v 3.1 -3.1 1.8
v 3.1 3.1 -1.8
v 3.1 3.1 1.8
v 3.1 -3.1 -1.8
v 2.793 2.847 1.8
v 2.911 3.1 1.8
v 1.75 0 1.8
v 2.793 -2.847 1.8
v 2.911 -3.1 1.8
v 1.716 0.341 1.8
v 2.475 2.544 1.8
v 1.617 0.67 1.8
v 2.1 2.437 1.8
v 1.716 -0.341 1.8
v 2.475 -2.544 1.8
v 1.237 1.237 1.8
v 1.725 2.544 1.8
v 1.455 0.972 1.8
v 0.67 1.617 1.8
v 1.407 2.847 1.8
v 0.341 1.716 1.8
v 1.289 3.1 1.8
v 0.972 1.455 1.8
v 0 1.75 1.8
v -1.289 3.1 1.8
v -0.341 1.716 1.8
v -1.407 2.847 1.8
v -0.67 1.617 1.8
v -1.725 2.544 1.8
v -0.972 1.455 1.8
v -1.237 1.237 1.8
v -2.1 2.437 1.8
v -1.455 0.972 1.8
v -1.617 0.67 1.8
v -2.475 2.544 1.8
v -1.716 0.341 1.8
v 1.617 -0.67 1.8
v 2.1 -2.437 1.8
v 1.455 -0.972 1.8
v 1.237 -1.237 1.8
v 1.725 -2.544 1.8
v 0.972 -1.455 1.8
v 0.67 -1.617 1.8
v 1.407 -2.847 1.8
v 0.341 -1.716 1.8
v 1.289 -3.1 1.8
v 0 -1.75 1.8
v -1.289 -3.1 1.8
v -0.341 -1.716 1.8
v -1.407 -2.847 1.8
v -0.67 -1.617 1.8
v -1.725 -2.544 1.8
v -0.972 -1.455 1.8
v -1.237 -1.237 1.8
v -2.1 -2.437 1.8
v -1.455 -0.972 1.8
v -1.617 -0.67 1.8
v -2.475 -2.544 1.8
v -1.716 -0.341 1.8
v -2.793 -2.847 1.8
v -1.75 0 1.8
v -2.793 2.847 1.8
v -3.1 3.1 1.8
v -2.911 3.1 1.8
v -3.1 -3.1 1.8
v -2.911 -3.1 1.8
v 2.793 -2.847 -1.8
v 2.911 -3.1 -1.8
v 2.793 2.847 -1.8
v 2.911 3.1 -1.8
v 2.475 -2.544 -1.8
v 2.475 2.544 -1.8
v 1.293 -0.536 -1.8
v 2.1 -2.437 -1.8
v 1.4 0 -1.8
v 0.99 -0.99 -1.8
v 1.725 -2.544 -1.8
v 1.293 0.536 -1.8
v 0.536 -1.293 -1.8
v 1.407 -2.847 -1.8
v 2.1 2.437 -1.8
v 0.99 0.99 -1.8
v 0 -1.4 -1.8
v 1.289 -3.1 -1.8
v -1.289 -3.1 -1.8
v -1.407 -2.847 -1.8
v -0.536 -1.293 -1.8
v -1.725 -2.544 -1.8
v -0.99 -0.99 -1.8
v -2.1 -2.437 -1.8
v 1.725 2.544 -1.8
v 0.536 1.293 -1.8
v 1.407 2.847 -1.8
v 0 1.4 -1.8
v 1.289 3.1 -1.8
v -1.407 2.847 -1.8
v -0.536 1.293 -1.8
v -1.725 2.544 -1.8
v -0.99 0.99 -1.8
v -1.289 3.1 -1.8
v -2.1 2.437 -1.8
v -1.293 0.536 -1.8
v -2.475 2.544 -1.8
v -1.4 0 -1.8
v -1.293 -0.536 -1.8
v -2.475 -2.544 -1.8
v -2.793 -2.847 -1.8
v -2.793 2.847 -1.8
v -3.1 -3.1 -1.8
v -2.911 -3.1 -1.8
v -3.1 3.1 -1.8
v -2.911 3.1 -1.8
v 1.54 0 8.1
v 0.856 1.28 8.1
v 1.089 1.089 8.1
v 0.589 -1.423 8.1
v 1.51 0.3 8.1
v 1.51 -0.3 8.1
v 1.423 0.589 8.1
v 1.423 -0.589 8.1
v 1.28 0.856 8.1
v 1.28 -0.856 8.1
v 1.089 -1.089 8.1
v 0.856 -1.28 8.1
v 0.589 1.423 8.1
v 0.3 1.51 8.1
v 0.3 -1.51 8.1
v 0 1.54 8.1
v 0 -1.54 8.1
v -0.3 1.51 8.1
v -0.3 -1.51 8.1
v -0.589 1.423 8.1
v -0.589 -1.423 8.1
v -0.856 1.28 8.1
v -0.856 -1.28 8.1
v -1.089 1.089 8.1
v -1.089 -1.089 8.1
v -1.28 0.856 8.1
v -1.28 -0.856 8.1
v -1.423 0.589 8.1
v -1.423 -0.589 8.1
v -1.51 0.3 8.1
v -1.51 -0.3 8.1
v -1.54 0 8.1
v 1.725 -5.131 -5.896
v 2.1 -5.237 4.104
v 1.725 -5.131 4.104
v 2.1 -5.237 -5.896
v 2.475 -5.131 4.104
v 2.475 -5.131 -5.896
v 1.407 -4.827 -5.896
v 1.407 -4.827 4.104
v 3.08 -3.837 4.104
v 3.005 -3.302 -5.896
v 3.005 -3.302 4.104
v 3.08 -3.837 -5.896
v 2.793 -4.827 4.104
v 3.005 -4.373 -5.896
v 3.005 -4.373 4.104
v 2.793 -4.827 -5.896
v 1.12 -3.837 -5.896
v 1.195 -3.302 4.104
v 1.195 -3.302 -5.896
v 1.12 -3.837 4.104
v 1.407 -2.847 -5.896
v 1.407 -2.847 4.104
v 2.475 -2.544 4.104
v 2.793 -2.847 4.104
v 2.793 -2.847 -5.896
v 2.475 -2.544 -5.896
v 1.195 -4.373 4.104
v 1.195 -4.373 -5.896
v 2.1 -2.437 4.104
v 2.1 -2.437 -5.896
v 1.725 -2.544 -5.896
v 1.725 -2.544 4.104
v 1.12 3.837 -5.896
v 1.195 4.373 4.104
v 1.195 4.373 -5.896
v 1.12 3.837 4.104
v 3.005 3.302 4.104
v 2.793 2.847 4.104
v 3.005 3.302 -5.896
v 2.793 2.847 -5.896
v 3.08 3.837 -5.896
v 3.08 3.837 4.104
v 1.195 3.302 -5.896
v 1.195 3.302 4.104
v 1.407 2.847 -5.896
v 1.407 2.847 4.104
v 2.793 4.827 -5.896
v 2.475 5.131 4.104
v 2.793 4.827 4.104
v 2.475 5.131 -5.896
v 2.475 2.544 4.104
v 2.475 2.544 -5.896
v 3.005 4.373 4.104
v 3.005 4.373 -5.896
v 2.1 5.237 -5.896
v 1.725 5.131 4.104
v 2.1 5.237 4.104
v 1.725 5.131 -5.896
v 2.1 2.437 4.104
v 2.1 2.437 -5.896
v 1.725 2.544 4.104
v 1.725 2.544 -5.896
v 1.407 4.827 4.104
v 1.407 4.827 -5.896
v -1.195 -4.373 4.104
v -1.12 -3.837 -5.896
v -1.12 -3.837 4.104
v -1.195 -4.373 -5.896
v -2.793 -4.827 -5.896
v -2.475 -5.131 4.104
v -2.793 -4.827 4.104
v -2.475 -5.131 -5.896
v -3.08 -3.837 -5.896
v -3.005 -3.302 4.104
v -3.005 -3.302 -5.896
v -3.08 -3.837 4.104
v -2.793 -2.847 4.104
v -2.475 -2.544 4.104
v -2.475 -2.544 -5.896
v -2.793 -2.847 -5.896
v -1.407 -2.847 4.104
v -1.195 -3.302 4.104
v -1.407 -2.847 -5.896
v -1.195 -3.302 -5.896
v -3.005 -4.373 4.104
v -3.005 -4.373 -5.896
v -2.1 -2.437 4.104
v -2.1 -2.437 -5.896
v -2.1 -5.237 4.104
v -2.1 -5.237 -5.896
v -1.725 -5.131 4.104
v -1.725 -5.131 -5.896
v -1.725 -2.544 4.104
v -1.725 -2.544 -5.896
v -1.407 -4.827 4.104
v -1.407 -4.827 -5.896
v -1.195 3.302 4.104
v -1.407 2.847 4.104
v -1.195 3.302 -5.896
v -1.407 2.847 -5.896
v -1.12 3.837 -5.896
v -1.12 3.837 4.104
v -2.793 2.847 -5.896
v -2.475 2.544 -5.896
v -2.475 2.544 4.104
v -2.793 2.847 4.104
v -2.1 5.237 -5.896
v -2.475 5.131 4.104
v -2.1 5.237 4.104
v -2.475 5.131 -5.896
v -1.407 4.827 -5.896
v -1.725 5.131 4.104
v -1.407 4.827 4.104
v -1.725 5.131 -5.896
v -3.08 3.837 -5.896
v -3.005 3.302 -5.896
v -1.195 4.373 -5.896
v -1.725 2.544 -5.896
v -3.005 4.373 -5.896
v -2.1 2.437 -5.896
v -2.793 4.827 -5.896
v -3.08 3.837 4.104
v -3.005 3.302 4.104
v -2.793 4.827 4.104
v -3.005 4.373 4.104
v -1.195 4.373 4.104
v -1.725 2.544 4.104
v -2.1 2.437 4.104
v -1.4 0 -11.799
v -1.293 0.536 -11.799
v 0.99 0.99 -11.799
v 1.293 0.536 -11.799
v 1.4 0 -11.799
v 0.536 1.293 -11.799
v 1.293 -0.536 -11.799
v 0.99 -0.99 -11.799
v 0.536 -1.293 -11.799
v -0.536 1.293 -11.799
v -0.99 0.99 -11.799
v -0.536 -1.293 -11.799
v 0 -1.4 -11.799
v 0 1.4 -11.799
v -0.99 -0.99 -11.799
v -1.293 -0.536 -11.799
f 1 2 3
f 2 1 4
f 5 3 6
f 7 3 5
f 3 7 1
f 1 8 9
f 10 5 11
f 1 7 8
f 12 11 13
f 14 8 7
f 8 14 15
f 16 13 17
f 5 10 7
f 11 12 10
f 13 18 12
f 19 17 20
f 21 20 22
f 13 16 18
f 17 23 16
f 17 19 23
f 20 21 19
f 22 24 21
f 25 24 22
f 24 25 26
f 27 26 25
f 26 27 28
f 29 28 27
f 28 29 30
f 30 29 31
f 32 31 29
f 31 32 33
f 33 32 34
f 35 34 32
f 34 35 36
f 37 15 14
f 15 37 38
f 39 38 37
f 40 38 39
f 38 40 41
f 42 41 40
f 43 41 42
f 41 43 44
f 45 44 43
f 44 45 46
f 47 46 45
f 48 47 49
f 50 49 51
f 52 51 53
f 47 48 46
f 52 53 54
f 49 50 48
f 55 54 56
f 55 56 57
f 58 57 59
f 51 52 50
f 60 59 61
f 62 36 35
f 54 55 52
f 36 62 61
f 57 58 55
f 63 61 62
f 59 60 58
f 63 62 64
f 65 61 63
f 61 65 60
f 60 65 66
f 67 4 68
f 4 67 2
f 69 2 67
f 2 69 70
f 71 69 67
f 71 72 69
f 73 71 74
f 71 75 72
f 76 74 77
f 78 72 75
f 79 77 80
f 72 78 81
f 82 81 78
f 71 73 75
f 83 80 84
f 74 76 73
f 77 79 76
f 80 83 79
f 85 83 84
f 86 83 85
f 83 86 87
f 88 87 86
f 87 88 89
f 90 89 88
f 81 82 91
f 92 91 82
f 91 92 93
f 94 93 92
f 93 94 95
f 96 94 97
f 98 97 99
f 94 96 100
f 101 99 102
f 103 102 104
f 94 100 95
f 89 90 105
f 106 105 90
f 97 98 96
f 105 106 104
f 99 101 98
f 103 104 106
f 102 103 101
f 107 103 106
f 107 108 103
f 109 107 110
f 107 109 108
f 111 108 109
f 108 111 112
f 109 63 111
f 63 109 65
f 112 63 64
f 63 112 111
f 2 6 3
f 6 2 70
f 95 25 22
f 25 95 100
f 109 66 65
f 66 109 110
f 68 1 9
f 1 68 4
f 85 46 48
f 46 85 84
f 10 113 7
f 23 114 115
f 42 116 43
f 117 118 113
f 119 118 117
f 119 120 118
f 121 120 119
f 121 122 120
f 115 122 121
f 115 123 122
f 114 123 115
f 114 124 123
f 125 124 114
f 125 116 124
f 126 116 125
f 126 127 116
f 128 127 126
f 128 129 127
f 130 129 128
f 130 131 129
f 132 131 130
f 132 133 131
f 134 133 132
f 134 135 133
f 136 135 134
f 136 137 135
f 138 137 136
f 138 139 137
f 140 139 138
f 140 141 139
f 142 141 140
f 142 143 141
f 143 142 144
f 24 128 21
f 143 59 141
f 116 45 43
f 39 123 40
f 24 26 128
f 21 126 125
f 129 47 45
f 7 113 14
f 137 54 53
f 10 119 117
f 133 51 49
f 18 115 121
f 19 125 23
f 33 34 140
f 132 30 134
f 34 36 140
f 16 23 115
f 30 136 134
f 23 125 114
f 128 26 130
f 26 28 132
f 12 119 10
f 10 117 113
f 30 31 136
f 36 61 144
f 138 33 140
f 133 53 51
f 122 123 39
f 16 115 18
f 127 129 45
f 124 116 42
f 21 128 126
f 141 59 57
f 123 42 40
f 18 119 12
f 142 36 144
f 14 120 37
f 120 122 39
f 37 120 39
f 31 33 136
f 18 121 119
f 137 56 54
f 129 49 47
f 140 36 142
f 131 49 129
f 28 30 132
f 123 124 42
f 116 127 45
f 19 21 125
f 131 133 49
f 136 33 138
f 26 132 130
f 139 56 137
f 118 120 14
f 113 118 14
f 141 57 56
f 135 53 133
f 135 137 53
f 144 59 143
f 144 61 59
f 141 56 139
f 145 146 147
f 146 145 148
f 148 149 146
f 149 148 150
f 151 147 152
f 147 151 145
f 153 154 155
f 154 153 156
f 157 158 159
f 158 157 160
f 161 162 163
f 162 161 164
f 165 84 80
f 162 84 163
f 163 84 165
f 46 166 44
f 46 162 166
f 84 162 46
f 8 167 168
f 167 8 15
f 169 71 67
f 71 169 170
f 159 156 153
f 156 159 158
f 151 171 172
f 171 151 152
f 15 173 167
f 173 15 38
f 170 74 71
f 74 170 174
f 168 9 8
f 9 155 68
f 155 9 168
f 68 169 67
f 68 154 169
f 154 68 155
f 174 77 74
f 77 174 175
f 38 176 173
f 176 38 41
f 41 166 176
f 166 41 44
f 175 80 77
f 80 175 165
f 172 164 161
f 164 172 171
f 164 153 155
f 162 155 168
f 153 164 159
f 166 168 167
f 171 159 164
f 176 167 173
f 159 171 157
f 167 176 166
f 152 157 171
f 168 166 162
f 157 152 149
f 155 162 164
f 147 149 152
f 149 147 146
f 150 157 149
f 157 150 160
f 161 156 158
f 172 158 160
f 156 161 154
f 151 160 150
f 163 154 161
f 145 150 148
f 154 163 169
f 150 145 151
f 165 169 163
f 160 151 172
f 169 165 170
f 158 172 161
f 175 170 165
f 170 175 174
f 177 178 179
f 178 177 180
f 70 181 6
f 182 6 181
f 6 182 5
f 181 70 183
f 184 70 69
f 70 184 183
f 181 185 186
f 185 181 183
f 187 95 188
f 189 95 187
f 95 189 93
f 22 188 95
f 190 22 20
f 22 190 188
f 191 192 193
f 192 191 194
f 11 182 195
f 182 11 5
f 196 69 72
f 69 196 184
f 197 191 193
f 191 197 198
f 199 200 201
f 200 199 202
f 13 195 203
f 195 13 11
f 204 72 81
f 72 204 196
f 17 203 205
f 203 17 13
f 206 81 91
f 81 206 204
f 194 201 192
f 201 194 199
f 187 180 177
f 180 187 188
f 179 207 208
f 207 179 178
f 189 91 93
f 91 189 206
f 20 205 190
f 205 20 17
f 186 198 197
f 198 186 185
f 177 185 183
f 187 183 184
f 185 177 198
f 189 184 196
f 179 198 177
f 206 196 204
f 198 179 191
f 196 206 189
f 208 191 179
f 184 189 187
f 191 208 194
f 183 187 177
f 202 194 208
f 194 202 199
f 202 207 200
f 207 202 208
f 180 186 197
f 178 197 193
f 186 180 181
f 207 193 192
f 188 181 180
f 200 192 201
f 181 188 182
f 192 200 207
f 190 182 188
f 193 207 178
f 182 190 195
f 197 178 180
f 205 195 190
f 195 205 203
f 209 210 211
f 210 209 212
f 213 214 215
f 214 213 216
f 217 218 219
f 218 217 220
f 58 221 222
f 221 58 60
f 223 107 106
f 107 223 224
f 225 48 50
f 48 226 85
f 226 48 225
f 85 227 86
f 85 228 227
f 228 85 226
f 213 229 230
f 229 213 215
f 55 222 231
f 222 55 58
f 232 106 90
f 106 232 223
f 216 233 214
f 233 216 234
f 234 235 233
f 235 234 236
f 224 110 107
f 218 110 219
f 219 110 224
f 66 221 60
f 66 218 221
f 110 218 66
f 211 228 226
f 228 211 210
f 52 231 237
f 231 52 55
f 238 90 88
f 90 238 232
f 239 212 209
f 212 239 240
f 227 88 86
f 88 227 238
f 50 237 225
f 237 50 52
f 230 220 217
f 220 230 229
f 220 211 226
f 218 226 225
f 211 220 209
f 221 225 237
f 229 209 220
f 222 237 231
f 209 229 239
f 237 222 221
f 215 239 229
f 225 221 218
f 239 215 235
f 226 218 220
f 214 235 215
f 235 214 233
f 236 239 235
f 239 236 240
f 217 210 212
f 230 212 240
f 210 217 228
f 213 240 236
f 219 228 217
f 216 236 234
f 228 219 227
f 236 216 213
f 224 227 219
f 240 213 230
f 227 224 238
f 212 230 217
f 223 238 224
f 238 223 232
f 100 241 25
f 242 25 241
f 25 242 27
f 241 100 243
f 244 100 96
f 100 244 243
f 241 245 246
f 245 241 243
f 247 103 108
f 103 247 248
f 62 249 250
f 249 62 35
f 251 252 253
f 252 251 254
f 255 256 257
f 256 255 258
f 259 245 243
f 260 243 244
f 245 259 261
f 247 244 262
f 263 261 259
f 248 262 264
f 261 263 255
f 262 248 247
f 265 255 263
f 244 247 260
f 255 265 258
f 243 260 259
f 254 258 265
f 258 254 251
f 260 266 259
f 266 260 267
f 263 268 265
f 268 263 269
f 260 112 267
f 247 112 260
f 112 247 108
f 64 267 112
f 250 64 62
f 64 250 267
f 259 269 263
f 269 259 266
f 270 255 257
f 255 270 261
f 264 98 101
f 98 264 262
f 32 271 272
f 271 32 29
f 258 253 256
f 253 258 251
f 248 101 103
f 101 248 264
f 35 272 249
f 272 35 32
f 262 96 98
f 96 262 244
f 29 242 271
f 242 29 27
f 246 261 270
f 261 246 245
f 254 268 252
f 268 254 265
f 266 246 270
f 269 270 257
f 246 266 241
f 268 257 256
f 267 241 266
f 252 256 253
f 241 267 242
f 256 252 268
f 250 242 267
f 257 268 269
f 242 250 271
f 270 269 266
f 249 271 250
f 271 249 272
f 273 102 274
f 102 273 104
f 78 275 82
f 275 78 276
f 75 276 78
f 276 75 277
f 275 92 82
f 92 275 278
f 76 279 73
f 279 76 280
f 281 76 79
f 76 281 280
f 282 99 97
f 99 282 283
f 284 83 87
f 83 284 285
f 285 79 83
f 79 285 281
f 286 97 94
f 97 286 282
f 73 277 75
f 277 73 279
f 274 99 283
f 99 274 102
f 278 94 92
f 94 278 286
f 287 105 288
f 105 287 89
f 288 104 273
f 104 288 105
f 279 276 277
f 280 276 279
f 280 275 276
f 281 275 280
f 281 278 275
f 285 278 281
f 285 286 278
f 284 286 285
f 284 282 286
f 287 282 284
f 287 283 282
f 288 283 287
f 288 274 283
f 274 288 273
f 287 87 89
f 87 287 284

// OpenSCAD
// Start: lazy_union
default_5_default_5();
// End: lazy_union

// Modules.

// 'PartMaterial undef-default - default 5.0'
module default_5_default_5() {
  // 'None : _combine_solids_and_holes'
  union() {
    // 'default : _combine_solids_and_holes'
    union() {
      // 'switch : _combine_solids_and_holes'
      union() {
        // 'body'
        multmatrix(m=[[1.0, 0.0, 0.0, -3.1], [0.0, 1.0, 0.0, -3.1], [0.0, 0.0, 1.0, -1.8], [0.0, 0.0, 0.0, 1.0]]) {
          // 'body : _combine_solids_and_holes'
          union() {
            // 'body'
            cube(size=[6.2, 6.2, 3.6]);
          }
        }
        // 'shaft'
        multmatrix(m=[[1.0, 0.0, 0.0, 0.0], [0.0, 1.0, 0.0, 0.0], [0.0, 0.0, 1.0, 1.8], [0.0, 0.0, 0.0, 1.0]]) {
          // 'shaft : _combine_solids_and_holes'
          union() {
            // 'shaft'
            cylinder(h=6.3, r1=1.75, r2=1.54, center=false, $fn=32);
          }
        }
        // ('lead', 3)
        multmatrix(m=[[0.0, 0.0, 1.0, -2.45], [0.0, -1.0, 0.0, -3.1], [1.0, 0.0, 0.0, -1.8], [0.0, 0.0, 0.0, 1.0]]) {
          // "('lead', 3) : _combine_solids_and_holes"
          union() {
            // 'terminal : _combine_solids_and_holes'
            union() {
              // 'terminal'
              linear_extrude(height=0.7, twist=0.0, slices=4, scale=[1.0, 1.0], $fn=32) {
                polygon(points=[[0.0, 0.0], [-0.7, 0.0], [-0.7359958083311317, 0.00216732586469226], [-0.7714715190194863, 0.008637988116077133], [-0.8059145492294425, 0.019318493196427367], [-0.8388272371594507, 0.03405452020635208], [-0.8697340326773294, 0.05263315066264182], [-0.8981883684676073, 0.07478594492317342], [-2.1481883684676077, 1.174785944923174], [-3.3981883684676086, 0.07478594492317447], [-3.426642704257887, 0.0526331506626429], [-3.457549499775765, 0.034054520206353245], [-3.4904621877057735, 0.019318493196428588], [-3.5249052179157294, 0.00863798811607841], [-3.560380928604084, 0.0021673258646935367], [-3.5963767369352158, 1.27675647831893e-15], [-4.096376736935216, 1.1906291571089884e-15], [-4.096376736935216, 0.30000000000000115], [-3.596376736935216, 0.3000000000000012], [-2.3463767369352158, 1.400000000000001], [-2.287015605627059, 1.4407314247168224], [-2.219659887487095, 1.466147956807097], [-2.1481883684676086, 1.4747859449231742], [-2.0767168494481223, 1.466147956807097], [-2.009361131308158, 1.4407314247168221], [-1.950000000000001, 1.4000000000000008], [-0.7000000000000015, 0.2999999999999998], [1.2999999999999983, 0.29999999999999827], [1.299999999999998, 0.0]]);
              }
            }
          }
        }
        // ('lead', 1)
        multmatrix(m=[[0.0, 0.0, 1.0, 1.75], [0.0, -1.0, 0.0, -3.1], [1.0, 0.0, 0.0, -1.8], [0.0, 0.0, 0.0, 1.0]]) {
          // "('lead', 1) : _combine_solids_and_holes"
          union() {
            // 'terminal : _combine_solids_and_holes'
            union() {
              // 'terminal'
              linear_extrude(height=0.7, twist=0.0, slices=4, scale=[1.0, 1.0], $fn=32) {
                polygon(points=[[0.0, 0.0], [-0.7, 0.0], [-0.7359958083311317, 0.00216732586469226], [-0.7714715190194863, 0.008637988116077133], [-0.8059145492294425, 0.019318493196427367], [-0.8388272371594507, 0.03405452020635208], [-0.8697340326773294, 0.05263315066264182], [-0.8981883684676073, 0.07478594492317342], [-2.1481883684676077, 1.174785944923174], [-3.3981883684676086, 0.07478594492317447], [-3.426642704257887, 0.0526331506626429], [-3.457549499775765, 0.034054520206353245], [-3.4904621877057735, 0.019318493196428588], [-3.5249052179157294, 0.00863798811607841], [-3.560380928604084, 0.0021673258646935367], [-3.5963767369352158, 1.27675647831893e-15], [-4.096376736935216, 1.1906291571089884e-15], [-4.096376736935216, 0.30000000000000115], [-3.596376736935216, 0.3000000000000012], [-2.3463767369352158, 1.400000000000001], [-2.287015605627059, 1.4407314247168224], [-2.219659887487095, 1.466147956807097], [-2.1481883684676086, 1.4747859449231742], [-2.0767168494481223, 1.466147956807097], [-2.009361131308158, 1.4407314247168221], [-1.950000000000001, 1.4000000000000008], [-0.7000000000000015, 0.2999999999999998], [1.2999999999999983, 0.29999999999999827], [1.299999999999998, 0.0]]);
              }
            }
          }
        }
        // ('lead', 2)
        multmatrix(m=[[0.0, 0.0, -1.0, 2.45], [0.0, 1.0, 0.0, 3.1], [1.0, 0.0, 0.0, -1.8], [0.0, 0.0, 0.0, 1.0]]) {
          // "('lead', 2) : _combine_solids_and_holes"
          union() {
            // 'terminal : _combine_solids_and_holes'
            union() {
              // 'terminal'
              linear_extrude(height=0.7, twist=0.0, slices=4, scale=[1.0, 1.0], $fn=32) {
                polygon(points=[[0.0, 0.0], [-0.7, 0.0], [-0.7359958083311317, 0.00216732586469226], [-0.7714715190194863, 0.008637988116077133], [-0.8059145492294425, 0.019318493196427367], [-0.8388272371594507, 0.03405452020635208], [-0.8697340326773294, 0.05263315066264182], [-0.8981883684676073, 0.07478594492317342], [-2.1481883684676077, 1.174785944923174], [-3.3981883684676086, 0.07478594492317447], [-3.426642704257887, 0.0526331506626429], [-3.457549499775765, 0.034054520206353245], [-3.4904621877057735, 0.019318493196428588], [-3.5249052179157294, 0.00863798811607841], [-3.560380928604084, 0.0021673258646935367], [-3.5963767369352158, 1.27675647831893e-15], [-4.096376736935216, 1.1906291571089884e-15], [-4.096376736935216, 0.30000000000000115], [-3.596376736935216, 0.3000000000000012], [-2.3463767369352158, 1.400000000000001], [-2.287015605627059, 1.4407314247168224], [-2.219659887487095, 1.466147956807097], [-2.1481883684676086, 1.4747859449231742], [-2.0767168494481223, 1.466147956807097], [-2.009361131308158, 1.4407314247168221], [-1.950000000000001, 1.4000000000000008], [-0.7000000000000015, 0.2999999999999998], [1.2999999999999983, 0.29999999999999827], [1.299999999999998, 0.0]]);
              }
            }
          }
        }
        // ('lead', 4)
        multmatrix(m=[[0.0, 0.0, -1.0, -1.75], [0.0, 1.0, 0.0, 3.1], [1.0, 0.0, 0.0, -1.8], [0.0, 0.0, 0.0, 1.0]]) {
          // "('lead', 4) : _combine_solids_and_holes"
          union() {
            // 'terminal : _combine_solids_and_holes'
            union() {
              // 'terminal'
              linear_extrude(height=0.7, twist=0.0, slices=4, scale=[1.0, 1.0], $fn=32) {
                polygon(points=[[0.0, 0.0], [-0.7, 0.0], [-0.7359958083311317, 0.00216732586469226], [-0.7714715190194863, 0.008637988116077133], [-0.8059145492294425, 0.019318493196427367], [-0.8388272371594507, 0.03405452020635208], [-0.8697340326773294, 0.05263315066264182], [-0.8981883684676073, 0.07478594492317342], [-2.1481883684676077, 1.174785944923174], [-3.3981883684676086, 0.07478594492317447], [-3.426642704257887, 0.0526331506626429], [-3.457549499775765, 0.034054520206353245], [-3.4904621877057735, 0.019318493196428588], [-3.5249052179157294, 0.00863798811607841], [-3.560380928604084, 0.0021673258646935367], [-3.5963767369352158, 1.27675647831893e-15], [-4.096376736935216, 1.1906291571089884e-15], [-4.096376736935216, 0.30000000000000115], [-3.596376736935216, 0.3000000000000012], [-2.3463767369352158, 1.400000000000001], [-2.287015605627059, 1.4407314247168224], [-2.219659887487095, 1.466147956807097], [-2.1481883684676086, 1.4747859449231742], [-2.0767168494481223, 1.466147956807097], [-2.009361131308158, 1.4407314247168221], [-1.950000000000001, 1.4000000000000008], [-0.7000000000000015, 0.2999999999999998], [1.2999999999999983, 0.29999999999999827], [1.299999999999998, 0.0]]);
              }
            }
          }
        }
      }
      // ('lead_hole_shape', 0)
      multmatrix(m=[[-0.7, 0.0, 0.0, 2.1], [0.0, 1.0, -7.771561172376097e-16, -3.8373929724615827], [0.0, -7.771561172376097e-16, -1.0, 4.103623263064785], [0.0, 0.0, 0.0, 1.0]]) {
        // "('lead_hole_shape', 0) : _combine_solids_and_holes"
        union() {
          // ('lead_hole_shape', 0)
          cylinder(h=10.0, r1=1.4, r2=1.4, center=false, $fn=16);
        }
      }
      // ('lead_hole_shape', 1)
      multmatrix(m=[[0.7, 0.0, 0.0, 2.1], [0.0, -1.0, 7.771561172376097e-16, 3.8373929724615827], [0.0, -7.771561172376097e-16, -1.0, 4.103623263064785], [0.0, 0.0, 0.0, 1.0]]) {
        // "('lead_hole_shape', 1) : _combine_solids_and_holes"
        union() {
          // ('lead_hole_shape', 1)
          cylinder(h=10.0, r1=1.4, r2=1.4, center=false, $fn=16);
        }
      }
      // ('lead_hole_shape', 2)
      multmatrix(m=[[-0.7, 0.0, 0.0, -2.1], [0.0, 1.0, -7.771561172376097e-16, -3.8373929724615827], [0.0, -7.771561172376097e-16, -1.0, 4.103623263064785], [0.0, 0.0, 0.0, 1.0]]) {
        // "('lead_hole_shape', 2) : _combine_solids_and_holes"
        union() {
          // ('lead_hole_shape', 2)
          cylinder(h=10.0, r1=1.4, r2=1.4, center=false, $fn=16);
        }
      }
      // ('lead_hole_shape', 3)
      multmatrix(m=[[0.7, 0.0, 0.0, -2.1], [0.0, -1.0, 7.771561172376097e-16, 3.8373929724615827], [0.0, -7.771561172376097e-16, -1.0, 4.103623263064785], [0.0, 0.0, 0.0, 1.0]]) {
        // "('lead_hole_shape', 3) : _combine_solids_and_holes"
        union() {
          // ('lead_hole_shape', 3)
          cylinder(h=10.0, r1=1.4, r2=1.4, center=false, $fn=16);
        }
      }
      // 'push_hole_shape'
      multmatrix(m=[[1.0, 0.0, 0.0, 0.0], [0.0, 1.0, 0.0, 0.0], [0.0, 0.0, 1.0, -11.799], [0.0, 0.0, 0.0, 1.0]]) {
        // 'push_hole_shape : _combine_solids_and_holes'
        union() {
          // 'push_hole_shape'
          cylinder(h=10.0, r1=1.4, r2=1.4, center=false, $fn=16);
        }
      }
    }
  }
} // end module default_5_default_5
